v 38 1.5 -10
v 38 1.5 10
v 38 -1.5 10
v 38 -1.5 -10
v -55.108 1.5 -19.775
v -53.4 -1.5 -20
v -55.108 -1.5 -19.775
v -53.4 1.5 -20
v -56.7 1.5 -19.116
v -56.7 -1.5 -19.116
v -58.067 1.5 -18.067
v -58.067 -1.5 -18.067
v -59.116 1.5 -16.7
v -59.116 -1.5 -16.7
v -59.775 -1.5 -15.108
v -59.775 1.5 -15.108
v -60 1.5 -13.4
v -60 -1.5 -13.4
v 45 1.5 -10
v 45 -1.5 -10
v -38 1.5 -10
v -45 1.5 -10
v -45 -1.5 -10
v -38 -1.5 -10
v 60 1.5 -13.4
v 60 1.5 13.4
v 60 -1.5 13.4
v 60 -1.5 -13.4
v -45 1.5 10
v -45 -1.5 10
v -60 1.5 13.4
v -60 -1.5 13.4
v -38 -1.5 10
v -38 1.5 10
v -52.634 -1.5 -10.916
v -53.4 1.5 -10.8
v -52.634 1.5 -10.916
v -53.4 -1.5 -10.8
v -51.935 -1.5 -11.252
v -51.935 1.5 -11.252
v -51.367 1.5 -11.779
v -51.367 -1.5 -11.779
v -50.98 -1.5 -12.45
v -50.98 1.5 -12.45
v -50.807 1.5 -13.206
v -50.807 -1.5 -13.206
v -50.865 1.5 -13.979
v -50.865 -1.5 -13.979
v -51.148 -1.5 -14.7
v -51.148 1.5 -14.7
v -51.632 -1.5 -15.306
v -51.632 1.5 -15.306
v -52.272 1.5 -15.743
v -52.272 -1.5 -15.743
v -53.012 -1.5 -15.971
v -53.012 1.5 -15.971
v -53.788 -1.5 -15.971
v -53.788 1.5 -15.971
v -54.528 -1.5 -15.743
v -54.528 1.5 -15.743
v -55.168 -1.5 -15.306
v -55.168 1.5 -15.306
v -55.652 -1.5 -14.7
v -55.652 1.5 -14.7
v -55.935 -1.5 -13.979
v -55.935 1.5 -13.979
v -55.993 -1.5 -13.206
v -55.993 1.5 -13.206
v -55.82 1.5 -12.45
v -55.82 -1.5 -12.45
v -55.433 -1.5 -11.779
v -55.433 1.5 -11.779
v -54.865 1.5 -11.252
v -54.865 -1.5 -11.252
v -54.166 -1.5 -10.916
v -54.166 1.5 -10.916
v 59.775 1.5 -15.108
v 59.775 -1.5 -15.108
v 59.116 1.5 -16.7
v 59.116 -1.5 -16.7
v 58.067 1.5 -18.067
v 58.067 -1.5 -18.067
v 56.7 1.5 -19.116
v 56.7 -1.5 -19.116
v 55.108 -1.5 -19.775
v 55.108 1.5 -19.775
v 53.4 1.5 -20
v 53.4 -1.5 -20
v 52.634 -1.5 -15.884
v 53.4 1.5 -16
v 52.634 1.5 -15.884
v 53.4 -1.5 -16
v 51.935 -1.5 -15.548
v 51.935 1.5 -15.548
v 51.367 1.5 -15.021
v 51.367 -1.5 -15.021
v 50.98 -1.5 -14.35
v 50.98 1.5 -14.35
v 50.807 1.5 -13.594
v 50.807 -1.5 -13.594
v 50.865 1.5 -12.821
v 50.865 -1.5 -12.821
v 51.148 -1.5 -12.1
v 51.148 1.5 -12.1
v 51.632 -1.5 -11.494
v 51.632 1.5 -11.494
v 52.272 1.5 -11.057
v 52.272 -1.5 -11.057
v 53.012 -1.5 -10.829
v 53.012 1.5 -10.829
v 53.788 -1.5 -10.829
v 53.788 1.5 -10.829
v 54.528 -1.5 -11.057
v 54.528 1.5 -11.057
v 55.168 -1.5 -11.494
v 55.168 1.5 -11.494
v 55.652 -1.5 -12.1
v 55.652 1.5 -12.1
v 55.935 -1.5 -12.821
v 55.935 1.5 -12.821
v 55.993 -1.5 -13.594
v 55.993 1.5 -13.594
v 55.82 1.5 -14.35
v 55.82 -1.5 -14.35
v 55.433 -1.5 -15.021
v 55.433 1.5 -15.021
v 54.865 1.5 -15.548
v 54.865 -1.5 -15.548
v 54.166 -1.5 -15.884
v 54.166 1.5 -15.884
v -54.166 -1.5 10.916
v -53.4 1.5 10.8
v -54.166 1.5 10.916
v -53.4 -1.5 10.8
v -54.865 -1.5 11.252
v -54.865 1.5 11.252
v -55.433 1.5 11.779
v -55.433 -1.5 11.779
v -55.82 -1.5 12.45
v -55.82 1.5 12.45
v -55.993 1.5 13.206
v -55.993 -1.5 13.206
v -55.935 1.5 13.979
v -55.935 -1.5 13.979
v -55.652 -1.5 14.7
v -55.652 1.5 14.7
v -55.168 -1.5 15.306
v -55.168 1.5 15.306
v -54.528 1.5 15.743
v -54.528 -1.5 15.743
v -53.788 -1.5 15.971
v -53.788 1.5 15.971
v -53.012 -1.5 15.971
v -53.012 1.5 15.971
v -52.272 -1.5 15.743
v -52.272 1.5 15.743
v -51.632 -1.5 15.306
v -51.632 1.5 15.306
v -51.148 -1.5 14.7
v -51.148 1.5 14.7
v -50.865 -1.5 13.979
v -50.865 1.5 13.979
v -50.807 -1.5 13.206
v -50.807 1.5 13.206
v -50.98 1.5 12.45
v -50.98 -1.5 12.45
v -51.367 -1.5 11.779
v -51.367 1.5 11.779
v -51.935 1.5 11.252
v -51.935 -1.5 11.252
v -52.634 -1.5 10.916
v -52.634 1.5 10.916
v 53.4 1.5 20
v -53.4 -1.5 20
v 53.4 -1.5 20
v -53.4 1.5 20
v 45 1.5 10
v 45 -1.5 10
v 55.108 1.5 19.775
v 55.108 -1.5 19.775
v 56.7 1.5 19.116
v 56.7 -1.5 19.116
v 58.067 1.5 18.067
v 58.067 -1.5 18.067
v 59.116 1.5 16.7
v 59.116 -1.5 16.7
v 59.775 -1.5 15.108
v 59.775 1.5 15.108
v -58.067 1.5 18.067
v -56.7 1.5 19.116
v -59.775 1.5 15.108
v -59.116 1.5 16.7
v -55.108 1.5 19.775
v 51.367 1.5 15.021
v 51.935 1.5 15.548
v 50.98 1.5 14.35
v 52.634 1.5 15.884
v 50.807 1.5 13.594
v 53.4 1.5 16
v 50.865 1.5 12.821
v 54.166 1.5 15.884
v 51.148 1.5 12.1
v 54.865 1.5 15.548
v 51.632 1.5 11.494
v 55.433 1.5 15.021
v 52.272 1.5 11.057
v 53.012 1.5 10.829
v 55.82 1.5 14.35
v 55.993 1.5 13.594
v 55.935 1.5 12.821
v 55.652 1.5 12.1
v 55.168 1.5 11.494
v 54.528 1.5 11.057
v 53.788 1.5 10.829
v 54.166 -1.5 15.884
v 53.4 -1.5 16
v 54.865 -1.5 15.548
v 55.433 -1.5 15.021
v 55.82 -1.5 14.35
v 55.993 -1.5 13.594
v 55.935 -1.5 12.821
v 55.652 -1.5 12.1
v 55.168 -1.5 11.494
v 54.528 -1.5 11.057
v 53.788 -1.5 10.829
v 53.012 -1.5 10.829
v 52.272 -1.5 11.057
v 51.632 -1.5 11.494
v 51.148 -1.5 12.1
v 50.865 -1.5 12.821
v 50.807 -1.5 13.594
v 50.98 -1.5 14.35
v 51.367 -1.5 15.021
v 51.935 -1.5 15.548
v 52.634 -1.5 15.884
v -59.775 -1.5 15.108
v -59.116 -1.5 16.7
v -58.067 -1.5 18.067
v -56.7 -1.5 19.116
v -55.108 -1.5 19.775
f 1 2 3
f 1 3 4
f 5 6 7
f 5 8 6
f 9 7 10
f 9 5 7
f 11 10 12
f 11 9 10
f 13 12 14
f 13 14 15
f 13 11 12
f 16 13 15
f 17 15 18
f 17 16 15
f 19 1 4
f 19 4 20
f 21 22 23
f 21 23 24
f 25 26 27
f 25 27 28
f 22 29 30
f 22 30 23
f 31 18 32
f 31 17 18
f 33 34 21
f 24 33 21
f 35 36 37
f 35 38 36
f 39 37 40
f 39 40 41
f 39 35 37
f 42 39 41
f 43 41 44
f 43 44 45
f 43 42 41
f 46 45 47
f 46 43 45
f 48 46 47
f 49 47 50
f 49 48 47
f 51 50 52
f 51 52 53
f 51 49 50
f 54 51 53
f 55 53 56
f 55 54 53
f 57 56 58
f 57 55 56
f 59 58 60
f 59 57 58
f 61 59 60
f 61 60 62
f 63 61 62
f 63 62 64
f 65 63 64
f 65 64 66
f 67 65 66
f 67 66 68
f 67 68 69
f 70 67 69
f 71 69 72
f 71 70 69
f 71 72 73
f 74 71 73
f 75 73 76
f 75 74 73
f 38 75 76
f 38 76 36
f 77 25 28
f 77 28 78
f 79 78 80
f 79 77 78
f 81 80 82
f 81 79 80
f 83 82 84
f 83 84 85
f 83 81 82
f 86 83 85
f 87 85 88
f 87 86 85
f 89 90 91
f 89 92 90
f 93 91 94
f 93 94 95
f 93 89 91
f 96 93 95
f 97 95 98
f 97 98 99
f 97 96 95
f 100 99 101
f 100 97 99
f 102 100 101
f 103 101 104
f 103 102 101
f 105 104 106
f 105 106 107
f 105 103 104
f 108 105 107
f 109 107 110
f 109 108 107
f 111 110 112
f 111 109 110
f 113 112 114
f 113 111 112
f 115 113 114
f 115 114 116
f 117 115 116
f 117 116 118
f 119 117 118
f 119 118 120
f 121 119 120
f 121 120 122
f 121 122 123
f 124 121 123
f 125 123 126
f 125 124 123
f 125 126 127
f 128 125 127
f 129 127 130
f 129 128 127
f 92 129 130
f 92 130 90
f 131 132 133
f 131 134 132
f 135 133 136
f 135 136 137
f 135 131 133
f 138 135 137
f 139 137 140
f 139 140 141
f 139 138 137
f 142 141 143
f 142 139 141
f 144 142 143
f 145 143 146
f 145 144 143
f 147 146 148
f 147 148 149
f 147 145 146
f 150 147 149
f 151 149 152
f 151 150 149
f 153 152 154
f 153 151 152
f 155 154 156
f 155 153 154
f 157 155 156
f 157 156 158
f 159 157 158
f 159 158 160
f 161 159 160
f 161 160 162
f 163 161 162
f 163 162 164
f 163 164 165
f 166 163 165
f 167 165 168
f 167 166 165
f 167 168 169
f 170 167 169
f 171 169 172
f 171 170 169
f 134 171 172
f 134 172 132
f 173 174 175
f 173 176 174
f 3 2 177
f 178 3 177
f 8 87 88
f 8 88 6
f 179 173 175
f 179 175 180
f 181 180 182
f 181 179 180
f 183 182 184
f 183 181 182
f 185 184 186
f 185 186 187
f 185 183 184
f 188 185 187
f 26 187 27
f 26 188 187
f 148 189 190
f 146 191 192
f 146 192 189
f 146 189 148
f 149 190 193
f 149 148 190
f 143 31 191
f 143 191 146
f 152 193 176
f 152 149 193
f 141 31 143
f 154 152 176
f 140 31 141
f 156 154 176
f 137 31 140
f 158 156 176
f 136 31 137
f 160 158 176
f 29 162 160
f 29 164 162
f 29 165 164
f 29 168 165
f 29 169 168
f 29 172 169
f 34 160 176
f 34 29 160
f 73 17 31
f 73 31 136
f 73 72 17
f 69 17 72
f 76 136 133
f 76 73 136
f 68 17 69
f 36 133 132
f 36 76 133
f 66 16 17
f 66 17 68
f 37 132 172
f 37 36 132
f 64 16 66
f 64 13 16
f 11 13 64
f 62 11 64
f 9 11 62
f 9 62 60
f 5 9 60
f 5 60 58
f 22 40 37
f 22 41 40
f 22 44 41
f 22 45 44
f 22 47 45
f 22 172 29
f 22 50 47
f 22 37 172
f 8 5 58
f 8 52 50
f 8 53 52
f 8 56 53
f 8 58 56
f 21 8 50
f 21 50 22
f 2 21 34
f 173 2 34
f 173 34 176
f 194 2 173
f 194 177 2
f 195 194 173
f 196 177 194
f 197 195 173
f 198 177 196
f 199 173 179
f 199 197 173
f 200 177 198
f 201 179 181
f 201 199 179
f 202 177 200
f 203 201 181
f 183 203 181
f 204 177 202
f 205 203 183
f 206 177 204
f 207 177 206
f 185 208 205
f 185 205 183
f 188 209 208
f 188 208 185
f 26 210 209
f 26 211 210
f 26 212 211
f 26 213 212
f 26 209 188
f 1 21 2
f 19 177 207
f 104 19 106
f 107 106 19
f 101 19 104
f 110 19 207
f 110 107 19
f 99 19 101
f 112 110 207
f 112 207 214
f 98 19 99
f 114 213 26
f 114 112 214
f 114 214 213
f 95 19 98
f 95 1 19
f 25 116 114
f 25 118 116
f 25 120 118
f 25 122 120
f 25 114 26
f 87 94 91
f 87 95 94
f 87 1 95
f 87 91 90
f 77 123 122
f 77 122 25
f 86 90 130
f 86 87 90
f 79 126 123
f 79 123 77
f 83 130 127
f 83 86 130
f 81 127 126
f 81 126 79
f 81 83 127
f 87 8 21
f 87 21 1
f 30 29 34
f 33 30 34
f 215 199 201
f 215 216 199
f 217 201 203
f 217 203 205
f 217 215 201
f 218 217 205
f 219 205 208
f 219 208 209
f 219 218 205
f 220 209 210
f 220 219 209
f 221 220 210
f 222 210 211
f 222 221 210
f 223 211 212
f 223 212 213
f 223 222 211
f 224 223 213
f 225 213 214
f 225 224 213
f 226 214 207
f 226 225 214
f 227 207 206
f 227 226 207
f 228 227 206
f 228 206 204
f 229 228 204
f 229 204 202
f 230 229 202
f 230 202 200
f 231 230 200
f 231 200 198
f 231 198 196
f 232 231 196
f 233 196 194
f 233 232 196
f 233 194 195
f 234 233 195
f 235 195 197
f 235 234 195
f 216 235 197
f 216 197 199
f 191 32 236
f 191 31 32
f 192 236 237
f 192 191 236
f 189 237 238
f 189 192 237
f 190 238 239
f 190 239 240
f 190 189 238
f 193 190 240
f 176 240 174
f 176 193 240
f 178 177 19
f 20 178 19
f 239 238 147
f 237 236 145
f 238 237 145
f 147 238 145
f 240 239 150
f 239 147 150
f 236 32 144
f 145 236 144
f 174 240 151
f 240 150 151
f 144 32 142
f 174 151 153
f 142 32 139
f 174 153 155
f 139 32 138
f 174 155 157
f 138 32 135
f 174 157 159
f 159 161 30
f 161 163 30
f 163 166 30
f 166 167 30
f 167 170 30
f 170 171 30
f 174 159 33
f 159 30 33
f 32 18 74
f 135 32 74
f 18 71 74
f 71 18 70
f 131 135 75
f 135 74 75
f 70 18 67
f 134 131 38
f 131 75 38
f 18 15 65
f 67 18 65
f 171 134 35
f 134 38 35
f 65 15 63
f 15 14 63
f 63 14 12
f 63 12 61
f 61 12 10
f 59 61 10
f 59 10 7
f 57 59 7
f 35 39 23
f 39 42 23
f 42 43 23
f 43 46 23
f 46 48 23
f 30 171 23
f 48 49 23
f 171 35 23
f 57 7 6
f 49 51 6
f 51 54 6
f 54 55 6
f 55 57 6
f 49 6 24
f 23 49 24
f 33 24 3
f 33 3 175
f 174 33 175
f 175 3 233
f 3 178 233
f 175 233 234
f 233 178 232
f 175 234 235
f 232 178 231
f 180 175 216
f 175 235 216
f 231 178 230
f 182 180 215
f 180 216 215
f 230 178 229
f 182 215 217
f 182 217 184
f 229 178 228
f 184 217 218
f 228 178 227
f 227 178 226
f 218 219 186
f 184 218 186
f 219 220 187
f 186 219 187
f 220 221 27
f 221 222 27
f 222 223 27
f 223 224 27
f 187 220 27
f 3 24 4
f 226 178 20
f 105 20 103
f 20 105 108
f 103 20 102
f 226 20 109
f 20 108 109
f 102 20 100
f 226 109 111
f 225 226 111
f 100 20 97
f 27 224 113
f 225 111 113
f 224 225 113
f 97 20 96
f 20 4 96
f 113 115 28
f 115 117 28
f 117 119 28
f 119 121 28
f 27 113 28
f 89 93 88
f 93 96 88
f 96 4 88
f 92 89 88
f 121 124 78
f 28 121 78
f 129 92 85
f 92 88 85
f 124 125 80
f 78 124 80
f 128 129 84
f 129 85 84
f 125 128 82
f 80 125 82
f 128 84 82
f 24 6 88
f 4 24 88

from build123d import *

# Parameters (mm, degrees)
SKETCH1_R           = 2.6
BOSS_EXTRUDE1_DEPTH = 1.5
SKETCH2_W           = 7
SKETCH2_H           = 20
CUT_EXTRUDE1_DEPTH  = 64.316664473


with BuildPart() as part:
    # Sketch1 → Boss-Extrude1 (new, symmetric)
    with BuildSketch(Plane(origin=(0, 0, 0), x_dir=(1, 0, 0), z_dir=(0, 1, 0))):
        with BuildLine():
            Line((-53.4, -20), (53.4, -20))
            ThreePointArc((53.4, -20), (58.066904756, -18.066904756), (60, -13.4))
            Line((60, -13.4), (60, 13.4))
            ThreePointArc((60, 13.4), (58.066904756, 18.066904756), (53.4, 20))
            Line((53.4, 20), (-53.4, 20))
            ThreePointArc((-53.4, 20), (-58.066904756, 18.066904756), (-60, 13.4))
            Line((-60, 13.4), (-60, -13.4))
            ThreePointArc((-60, -13.4), (-58.066904756, -18.066904756), (-53.4, -20))
        make_face()
        with Locations(Location((-53.4, 13.4, 0), (0, 0, 270))):
            Circle(SKETCH1_R, mode=Mode.SUBTRACT)
        with Locations(Location((53.4, 13.4, 0), (0, 0, 90))):
            Circle(SKETCH1_R, mode=Mode.SUBTRACT)
        with Locations(Location((53.4, -13.4, 0), (0, 0, 270))):
            Circle(SKETCH1_R, mode=Mode.SUBTRACT)
        with Locations(Location((-53.4, -13.4, 0), (0, 0, 90))):
            Circle(SKETCH1_R, mode=Mode.SUBTRACT)
    extrude(amount=BOSS_EXTRUDE1_DEPTH, both=True)

    # Sketch2 → Cut-Extrude1 (cut, through all)
    with BuildSketch(Plane(origin=(0, 1.5, 0), x_dir=(1, 0, 0), z_dir=(0, 1, 0))):
        with Locations((-41.5, 0)):
            Rectangle(SKETCH2_W, SKETCH2_H)
        with Locations((41.5, 0)):
            Rectangle(SKETCH2_W, SKETCH2_H)
    extrude(amount=-CUT_EXTRUDE1_DEPTH, mode=Mode.SUBTRACT)


solid = part.part
